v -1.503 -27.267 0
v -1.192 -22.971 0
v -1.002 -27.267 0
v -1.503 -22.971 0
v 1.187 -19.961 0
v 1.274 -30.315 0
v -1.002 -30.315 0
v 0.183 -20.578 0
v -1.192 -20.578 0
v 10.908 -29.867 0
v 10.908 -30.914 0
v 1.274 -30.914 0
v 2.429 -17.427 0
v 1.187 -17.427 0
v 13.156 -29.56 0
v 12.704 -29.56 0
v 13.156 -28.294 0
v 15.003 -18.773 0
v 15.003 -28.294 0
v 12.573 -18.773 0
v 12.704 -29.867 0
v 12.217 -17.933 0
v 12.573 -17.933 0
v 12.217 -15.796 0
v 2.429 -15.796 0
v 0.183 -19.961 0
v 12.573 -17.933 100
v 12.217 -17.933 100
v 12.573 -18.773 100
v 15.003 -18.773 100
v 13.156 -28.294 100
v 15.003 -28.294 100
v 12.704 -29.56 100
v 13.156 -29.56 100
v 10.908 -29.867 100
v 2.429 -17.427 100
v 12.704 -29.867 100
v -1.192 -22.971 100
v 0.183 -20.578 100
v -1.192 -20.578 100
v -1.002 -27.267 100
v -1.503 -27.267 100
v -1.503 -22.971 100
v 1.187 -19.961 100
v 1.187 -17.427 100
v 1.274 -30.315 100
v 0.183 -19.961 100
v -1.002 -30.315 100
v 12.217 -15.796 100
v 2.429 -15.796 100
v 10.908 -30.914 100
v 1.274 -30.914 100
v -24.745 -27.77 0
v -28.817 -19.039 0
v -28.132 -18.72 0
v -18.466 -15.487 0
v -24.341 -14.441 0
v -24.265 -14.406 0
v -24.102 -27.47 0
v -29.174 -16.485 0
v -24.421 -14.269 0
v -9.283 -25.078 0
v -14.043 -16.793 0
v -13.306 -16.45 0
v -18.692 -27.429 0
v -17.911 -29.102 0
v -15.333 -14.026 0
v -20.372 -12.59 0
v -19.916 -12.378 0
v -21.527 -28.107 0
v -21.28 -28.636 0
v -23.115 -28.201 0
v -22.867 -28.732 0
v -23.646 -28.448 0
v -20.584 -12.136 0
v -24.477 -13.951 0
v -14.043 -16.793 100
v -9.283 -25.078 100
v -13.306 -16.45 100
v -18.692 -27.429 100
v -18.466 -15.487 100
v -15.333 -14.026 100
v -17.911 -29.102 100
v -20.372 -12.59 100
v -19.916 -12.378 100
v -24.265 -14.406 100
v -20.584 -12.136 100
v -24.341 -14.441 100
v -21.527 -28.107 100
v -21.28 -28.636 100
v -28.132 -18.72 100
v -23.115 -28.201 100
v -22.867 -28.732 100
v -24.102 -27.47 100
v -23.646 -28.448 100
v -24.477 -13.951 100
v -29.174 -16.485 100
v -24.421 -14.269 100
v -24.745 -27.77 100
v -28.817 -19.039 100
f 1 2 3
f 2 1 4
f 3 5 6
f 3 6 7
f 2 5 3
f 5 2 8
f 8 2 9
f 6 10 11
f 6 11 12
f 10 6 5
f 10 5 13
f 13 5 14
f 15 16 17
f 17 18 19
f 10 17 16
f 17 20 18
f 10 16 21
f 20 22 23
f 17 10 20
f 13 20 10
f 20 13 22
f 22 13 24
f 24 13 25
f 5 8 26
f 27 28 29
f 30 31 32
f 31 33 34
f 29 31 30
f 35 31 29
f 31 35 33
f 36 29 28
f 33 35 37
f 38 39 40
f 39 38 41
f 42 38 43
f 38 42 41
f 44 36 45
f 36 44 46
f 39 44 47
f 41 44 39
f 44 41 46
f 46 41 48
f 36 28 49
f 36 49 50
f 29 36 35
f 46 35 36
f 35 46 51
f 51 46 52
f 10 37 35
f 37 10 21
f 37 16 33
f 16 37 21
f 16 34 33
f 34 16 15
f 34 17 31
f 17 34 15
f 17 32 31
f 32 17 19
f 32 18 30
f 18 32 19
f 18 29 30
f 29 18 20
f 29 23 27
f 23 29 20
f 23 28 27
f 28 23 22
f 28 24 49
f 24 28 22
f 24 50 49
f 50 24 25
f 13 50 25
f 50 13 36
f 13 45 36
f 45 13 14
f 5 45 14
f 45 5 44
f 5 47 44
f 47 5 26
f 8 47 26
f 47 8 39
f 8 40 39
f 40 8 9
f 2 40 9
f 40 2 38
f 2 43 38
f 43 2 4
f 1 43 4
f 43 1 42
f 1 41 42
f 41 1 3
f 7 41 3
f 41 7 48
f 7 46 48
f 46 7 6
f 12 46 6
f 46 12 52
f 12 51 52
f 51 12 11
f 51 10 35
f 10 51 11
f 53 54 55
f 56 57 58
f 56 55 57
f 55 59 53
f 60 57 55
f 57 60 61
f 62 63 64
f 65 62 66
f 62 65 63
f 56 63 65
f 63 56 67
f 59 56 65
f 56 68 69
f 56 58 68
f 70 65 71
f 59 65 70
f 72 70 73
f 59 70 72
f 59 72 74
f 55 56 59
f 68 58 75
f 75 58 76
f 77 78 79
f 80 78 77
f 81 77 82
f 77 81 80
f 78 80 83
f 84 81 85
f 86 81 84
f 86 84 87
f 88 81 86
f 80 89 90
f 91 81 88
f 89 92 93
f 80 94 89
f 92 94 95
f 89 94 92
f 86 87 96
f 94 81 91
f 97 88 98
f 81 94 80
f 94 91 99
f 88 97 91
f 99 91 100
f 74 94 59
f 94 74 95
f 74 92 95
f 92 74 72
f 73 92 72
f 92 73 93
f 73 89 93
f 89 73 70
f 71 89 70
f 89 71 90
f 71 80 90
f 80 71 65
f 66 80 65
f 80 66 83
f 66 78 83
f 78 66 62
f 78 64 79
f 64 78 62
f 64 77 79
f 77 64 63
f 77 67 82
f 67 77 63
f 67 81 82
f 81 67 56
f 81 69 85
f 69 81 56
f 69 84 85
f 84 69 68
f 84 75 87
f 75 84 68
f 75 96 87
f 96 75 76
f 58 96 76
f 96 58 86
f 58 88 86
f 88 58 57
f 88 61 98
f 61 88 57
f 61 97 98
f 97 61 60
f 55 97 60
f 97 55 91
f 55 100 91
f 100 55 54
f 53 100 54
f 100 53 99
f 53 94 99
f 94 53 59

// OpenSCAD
//seed1 = 15;
//seed2 = 15;
//seed3 = 15;
//size_vects = rands(3,10,20,seed1);
//translate_x_vects = rands(3,12,20,seed2);
//translate_y_vects = rands(3,10,20,seed3);
//
//translate([35,5,0])
//rotate([0,0,-165])
//linear_extrude(100)
//for (i=[0:19]){
//    translate([translate_x_vects[i],translate_y_vects[i],0])
//    square(size_vects[i]);
//}

razorbat_pillar1();
razorbat_pillar2();

module razorbat_pillar1(h=100) {
    seed4 = 2;
    seed5 = 5;
    seed6 = 80;
    size_vects2 = rands(3,10,20,seed4);
    translate_x_vects2 = rands(3,12,20,seed5);
    translate_y_vects2 = rands(3,10,20,seed6);

    translate([-5,-35,0])
    linear_extrude(h)
    for (i=[0:19]){
        translate([translate_x_vects2[i],translate_y_vects2[i],0])
        square(size_vects2[i]);
    }
}

module razorbat_pillar2(h=100) {
    seed7 = 2;
    seed8 = 5;
    seed9 = 1;
    size_vects3 = rands(3,10,20,seed7);
    translate_x_vects3 = rands(3,12,20,seed8);
    translate_y_vects3 = rands(3,10,20,seed9);

    translate([-35,-15,0])
    rotate([0,0,-65])
    linear_extrude(h)
    for (i=[0:19]){
        translate([translate_x_vects3[i],translate_y_vects3[i],0])
        square(size_vects3[i]);
    }
}
